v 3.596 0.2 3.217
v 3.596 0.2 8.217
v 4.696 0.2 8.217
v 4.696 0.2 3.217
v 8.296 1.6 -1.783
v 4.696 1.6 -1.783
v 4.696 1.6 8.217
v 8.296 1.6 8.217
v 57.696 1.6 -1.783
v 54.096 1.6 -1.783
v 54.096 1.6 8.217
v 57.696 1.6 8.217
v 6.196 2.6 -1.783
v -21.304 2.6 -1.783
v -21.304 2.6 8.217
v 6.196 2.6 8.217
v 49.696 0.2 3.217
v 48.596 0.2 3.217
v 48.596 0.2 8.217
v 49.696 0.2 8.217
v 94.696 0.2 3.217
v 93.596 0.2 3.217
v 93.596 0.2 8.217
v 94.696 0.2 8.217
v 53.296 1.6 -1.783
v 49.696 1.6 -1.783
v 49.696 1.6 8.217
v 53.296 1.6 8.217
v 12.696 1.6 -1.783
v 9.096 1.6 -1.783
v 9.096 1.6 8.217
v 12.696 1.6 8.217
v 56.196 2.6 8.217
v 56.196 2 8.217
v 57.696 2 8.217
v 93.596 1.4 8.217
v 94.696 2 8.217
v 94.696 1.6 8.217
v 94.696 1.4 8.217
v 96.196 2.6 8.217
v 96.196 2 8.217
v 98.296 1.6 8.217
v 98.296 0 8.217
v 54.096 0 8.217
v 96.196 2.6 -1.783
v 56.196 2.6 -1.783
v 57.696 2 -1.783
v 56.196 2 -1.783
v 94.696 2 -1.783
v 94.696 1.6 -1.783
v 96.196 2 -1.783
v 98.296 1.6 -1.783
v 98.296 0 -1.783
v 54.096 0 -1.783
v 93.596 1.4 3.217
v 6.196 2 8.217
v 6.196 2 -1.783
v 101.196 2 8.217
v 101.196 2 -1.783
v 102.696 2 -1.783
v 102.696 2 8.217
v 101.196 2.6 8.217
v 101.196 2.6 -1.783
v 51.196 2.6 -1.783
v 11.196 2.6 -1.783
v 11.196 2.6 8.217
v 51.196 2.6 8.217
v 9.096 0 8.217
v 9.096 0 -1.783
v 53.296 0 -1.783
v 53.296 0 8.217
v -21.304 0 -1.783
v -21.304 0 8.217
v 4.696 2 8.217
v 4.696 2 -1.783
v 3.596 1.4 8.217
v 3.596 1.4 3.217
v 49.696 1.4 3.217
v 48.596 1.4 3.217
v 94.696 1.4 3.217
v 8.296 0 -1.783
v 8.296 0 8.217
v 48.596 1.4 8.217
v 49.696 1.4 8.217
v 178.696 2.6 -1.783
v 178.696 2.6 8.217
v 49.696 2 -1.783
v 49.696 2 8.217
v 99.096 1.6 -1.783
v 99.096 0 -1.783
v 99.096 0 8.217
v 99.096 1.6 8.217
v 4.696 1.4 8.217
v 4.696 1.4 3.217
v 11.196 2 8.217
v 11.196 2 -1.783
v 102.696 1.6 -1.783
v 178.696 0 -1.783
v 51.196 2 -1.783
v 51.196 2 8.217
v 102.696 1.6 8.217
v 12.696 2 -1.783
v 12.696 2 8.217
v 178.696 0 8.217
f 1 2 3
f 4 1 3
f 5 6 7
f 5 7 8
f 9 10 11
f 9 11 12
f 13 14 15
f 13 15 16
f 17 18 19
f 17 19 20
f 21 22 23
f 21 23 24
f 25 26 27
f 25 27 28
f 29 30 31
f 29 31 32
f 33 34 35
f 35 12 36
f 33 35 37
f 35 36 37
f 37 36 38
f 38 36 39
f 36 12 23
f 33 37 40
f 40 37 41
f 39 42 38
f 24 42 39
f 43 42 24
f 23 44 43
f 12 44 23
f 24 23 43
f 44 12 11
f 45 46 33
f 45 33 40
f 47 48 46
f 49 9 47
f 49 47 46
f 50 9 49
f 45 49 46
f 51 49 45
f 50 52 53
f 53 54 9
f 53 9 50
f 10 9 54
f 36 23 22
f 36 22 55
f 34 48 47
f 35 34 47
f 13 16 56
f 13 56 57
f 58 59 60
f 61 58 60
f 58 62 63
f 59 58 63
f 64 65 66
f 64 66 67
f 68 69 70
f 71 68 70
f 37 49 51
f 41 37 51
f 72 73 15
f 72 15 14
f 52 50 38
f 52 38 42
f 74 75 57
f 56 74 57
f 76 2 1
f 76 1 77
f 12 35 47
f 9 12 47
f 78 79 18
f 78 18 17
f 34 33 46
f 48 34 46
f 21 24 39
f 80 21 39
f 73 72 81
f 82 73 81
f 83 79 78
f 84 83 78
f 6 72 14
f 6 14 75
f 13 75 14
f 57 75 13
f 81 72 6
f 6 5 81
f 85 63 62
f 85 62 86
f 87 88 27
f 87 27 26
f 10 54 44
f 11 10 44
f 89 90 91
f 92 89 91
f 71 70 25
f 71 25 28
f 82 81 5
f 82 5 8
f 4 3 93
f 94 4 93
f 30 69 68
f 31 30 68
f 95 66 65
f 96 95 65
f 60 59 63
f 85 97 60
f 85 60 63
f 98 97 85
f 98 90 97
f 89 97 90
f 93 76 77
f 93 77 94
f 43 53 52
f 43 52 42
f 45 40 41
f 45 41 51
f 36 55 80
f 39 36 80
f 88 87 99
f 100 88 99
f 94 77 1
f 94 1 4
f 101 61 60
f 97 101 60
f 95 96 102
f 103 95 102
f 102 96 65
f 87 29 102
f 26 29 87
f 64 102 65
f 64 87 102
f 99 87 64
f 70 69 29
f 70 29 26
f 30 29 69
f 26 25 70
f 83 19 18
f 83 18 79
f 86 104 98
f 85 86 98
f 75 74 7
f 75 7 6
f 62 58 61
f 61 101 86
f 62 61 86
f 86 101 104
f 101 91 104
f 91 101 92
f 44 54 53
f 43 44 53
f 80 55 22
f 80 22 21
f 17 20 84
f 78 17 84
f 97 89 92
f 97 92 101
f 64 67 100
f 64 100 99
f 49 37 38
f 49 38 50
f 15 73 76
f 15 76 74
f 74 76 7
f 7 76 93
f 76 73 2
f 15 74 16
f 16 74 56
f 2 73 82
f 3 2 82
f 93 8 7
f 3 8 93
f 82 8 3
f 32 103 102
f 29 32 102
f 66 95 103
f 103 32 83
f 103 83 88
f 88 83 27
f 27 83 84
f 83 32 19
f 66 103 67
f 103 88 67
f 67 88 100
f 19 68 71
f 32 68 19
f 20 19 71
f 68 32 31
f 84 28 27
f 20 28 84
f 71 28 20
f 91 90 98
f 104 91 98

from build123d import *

# Parameters (mm, degrees)
SKETCH1_W             = 200
SKETCH1_H             = 10
BOSS_EXTRUDE1_DEPTH   = 2.6
SKETCH3_W             = 0.8
SKETCH3_H             = 10
CUT_EXTRUDE1_DEPTH    = 2
SKETCH4_W             = 5
SKETCH4_H             = 10
CUT_EXTRUDE2_DEPTH    = 0.6
SKETCH5_W             = 5
SKETCH5_H             = 10
BOSS_EXTRUDE2_DEPTH   = 0.6
BOSS_EXTRUDE2_2_DEPTH = 0.6
BOSS_EXTRUDE2_3_DEPTH = 0.6
SKETCH6_W             = 3.6
SKETCH6_H             = 10
CUT_EXTRUDE3_DEPTH    = 0.4
SKETCH11_W            = 1.1
SKETCH11_H            = 1.2
CUT_EXTRUDE4_DEPTH    = 5
SKETCH12_W            = 5
SKETCH12_H            = 10
CUT_EXTRUDE6_DEPTH    = 0.6


with BuildPart() as part:
    # Sketch1 → Boss-Extrude1 (new body)
    with BuildSketch(Plane(origin=(0, 0, 0), x_dir=(1, 0, 0), z_dir=(0, 1, 0))):
        with Locations((78.695652174, -3.217391304)):
            Rectangle(SKETCH1_W, SKETCH1_H)
    extrude(amount=BOSS_EXTRUDE1_DEPTH)

    # Sketch3 → Cut-Extrude1 (cut)
    with BuildSketch(Plane.XZ):
        with Locations((8.695652174, 3.217391304)):
            Rectangle(SKETCH3_W, SKETCH3_H)
        with Locations((53.695652174, 3.217391304)):
            Rectangle(SKETCH3_W, SKETCH3_H)
        with Locations((98.695652174, 3.217391304)):
            Rectangle(SKETCH3_W, SKETCH3_H)
    extrude(amount=-CUT_EXTRUDE1_DEPTH, mode=Mode.SUBTRACT)

    # Sketch4 → Cut-Extrude2 (cut)
    with BuildSketch(Plane(origin=(0, 2.6, 0), x_dir=(1, 0, 0), z_dir=(0, 1, 0))):
        with Locations((98.695652174, -3.217391304)):
            Rectangle(SKETCH4_W, SKETCH4_H)
        with Locations((53.695652174, -3.217391304)):
            Rectangle(SKETCH4_W, SKETCH4_H)
        with Locations((8.695652174, -3.217391304)):
            Rectangle(SKETCH4_W, SKETCH4_H)
    extrude(amount=-CUT_EXTRUDE2_DEPTH, mode=Mode.SUBTRACT)


with BuildPart() as cut_extrude2_piece_1:
    # of the separate pieces the step leaves, piece 1, a body of its own (cut_extrude2_pieces)
    add(part.part.solids().sort_by_distance((101.195652174, 2.6, 8.217391304))[0])


with BuildPart() as cut_extrude2_piece_2:
    # of the separate pieces the step leaves, piece 2, a body of its own (cut_extrude2_pieces)
    add(part.part.solids().sort_by_distance((56.195652174, 2.6, 8.217391304))[0])


with BuildPart() as cut_extrude2_piece_3:
    # of the separate pieces the step leaves, piece 3, a body of its own (cut_extrude2_pieces)
    add(part.part.solids().sort_by_distance((9.095652174, 0, 8.217391304))[0])


with BuildPart() as cut_extrude2_piece_4:
    # of the separate pieces the step leaves, piece 4, a body of its own (cut_extrude2_pieces)
    add(part.part.solids().sort_by_distance((-21.304347826, 0, 8.217391304))[0])


with BuildPart() as body_5:
    # Sketch5 → Boss-Extrude2 (new body)
    with BuildSketch(Plane(origin=(0, 2, 0), x_dir=(1, 0, 0), z_dir=(0, 1, 0))):
        with Locations((98.695652174, -3.217391304)):
            Rectangle(SKETCH5_W, SKETCH5_H)
    extrude(amount=BOSS_EXTRUDE2_DEPTH)


with BuildPart() as body_6:
    # Sketch5 → Boss-Extrude2 2 (new body)
    with BuildSketch(Plane(origin=(0, 2, 0), x_dir=(1, 0, 0), z_dir=(0, 1, 0))):
        with Locations((53.695652174, -3.217391304)):
            Rectangle(SKETCH5_W, SKETCH5_H)
    extrude(amount=BOSS_EXTRUDE2_2_DEPTH)


with BuildPart() as body_7:
    # Sketch5 → Boss-Extrude2 3 (new body)
    with BuildSketch(Plane(origin=(0, 2, 0), x_dir=(1, 0, 0), z_dir=(0, 1, 0))):
        with Locations((8.695652174, -3.217391304)):
            Rectangle(SKETCH5_W, SKETCH5_H)
    extrude(amount=BOSS_EXTRUDE2_3_DEPTH)


with BuildPart() as cut_extrude3_tool:
    # Sketch6 → Cut-Extrude3 (new body)
    with BuildSketch(Plane(origin=(0, 2, 0), x_dir=(1, 0, 0), z_dir=(0, 1, 0))):
        with Locations((10.895652174, -3.217391304)):
            Rectangle(SKETCH6_W, SKETCH6_H)
        with Locations((55.895652174, -3.217391304)):
            Rectangle(SKETCH6_W, SKETCH6_H)
        with Locations((51.495652174, -3.217391304)):
            Rectangle(SKETCH6_W, SKETCH6_H)
        with Locations((96.495652174, -3.217391304)):
            Rectangle(SKETCH6_W, SKETCH6_H)
        with Locations((100.895652174, -3.217391304)):
            Rectangle(SKETCH6_W, SKETCH6_H)
        with Locations((6.495652174, -3.217391304)):
            Rectangle(SKETCH6_W, SKETCH6_H)
    extrude(amount=-CUT_EXTRUDE3_DEPTH)


with BuildPart() as cut_extrude2_piece_1_1:
    add(cut_extrude2_piece_1.part)

    # Cut-Extrude3: cut by cut_extrude3_tool
    add(cut_extrude3_tool.part, mode=Mode.SUBTRACT)


with BuildPart() as cut_extrude2_piece_2_1:
    add(cut_extrude2_piece_2.part)

    # Cut-Extrude3: cut by cut_extrude3_tool
    add(cut_extrude3_tool.part, mode=Mode.SUBTRACT)


with BuildPart() as cut_extrude2_piece_3_1:
    add(cut_extrude2_piece_3.part)

    # Cut-Extrude3: cut by cut_extrude3_tool
    add(cut_extrude3_tool.part, mode=Mode.SUBTRACT)


with BuildPart() as cut_extrude2_piece_4_1:
    add(cut_extrude2_piece_4.part)

    # Cut-Extrude3: cut by cut_extrude3_tool
    add(cut_extrude3_tool.part, mode=Mode.SUBTRACT)


with BuildPart() as cut_extrude4_tool:
    # Sketch11 → Cut-Extrude4 (new body)
    with BuildSketch(Plane.XY.offset(8.217391304)):
        with Locations((4.145652174, 0.8)):
            Rectangle(SKETCH11_W, SKETCH11_H)
        with Locations((49.145652174, 0.8)):
            Rectangle(SKETCH11_W, SKETCH11_H)
        with Locations((94.145652174, 0.8)):
            Rectangle(SKETCH11_W, SKETCH11_H)
    extrude(amount=-CUT_EXTRUDE4_DEPTH)


with BuildPart() as cut_extrude2_piece_2_2:
    add(cut_extrude2_piece_2_1.part)

    # Cut-Extrude4: cut by cut_extrude4_tool
    add(cut_extrude4_tool.part, mode=Mode.SUBTRACT)


with BuildPart() as cut_extrude2_piece_3_2:
    add(cut_extrude2_piece_3_1.part)

    # Cut-Extrude4: cut by cut_extrude4_tool
    add(cut_extrude4_tool.part, mode=Mode.SUBTRACT)


with BuildPart() as cut_extrude2_piece_4_2:
    add(cut_extrude2_piece_4_1.part)

    # Cut-Extrude4: cut by cut_extrude4_tool
    add(cut_extrude4_tool.part, mode=Mode.SUBTRACT)


with BuildPart() as cut_extrude6_tool:
    # Sketch12 → Cut-Extrude6 (new body)
    with BuildSketch(Plane(origin=(0, 2.6, 0), x_dir=(1, 0, 0), z_dir=(0, 1, 0))):
        with Locations((8.695652174, -3.217391304)):
            Rectangle(SKETCH12_W, SKETCH12_H)
        with Locations((53.695652174, -3.217391304)):
            Rectangle(SKETCH12_W, SKETCH12_H)
        with Locations((98.695652174, -3.217391304)):
            Rectangle(SKETCH12_W, SKETCH12_H)
    extrude(amount=-CUT_EXTRUDE6_DEPTH)


with BuildPart() as body_5_1:
    add(body_5.part)

    # Cut-Extrude6: cut by cut_extrude6_tool
    add(cut_extrude6_tool.part, mode=Mode.SUBTRACT)


with BuildPart() as body_6_1:
    add(body_6.part)

    # Cut-Extrude6: cut by cut_extrude6_tool
    add(cut_extrude6_tool.part, mode=Mode.SUBTRACT)


with BuildPart() as body_7_1:
    add(body_7.part)

    # Cut-Extrude6: cut by cut_extrude6_tool
    add(cut_extrude6_tool.part, mode=Mode.SUBTRACT)


solid = Compound([cut_extrude2_piece_1_1.part, cut_extrude2_piece_2_2.part, cut_extrude2_piece_3_2.part, cut_extrude2_piece_4_2.part])
